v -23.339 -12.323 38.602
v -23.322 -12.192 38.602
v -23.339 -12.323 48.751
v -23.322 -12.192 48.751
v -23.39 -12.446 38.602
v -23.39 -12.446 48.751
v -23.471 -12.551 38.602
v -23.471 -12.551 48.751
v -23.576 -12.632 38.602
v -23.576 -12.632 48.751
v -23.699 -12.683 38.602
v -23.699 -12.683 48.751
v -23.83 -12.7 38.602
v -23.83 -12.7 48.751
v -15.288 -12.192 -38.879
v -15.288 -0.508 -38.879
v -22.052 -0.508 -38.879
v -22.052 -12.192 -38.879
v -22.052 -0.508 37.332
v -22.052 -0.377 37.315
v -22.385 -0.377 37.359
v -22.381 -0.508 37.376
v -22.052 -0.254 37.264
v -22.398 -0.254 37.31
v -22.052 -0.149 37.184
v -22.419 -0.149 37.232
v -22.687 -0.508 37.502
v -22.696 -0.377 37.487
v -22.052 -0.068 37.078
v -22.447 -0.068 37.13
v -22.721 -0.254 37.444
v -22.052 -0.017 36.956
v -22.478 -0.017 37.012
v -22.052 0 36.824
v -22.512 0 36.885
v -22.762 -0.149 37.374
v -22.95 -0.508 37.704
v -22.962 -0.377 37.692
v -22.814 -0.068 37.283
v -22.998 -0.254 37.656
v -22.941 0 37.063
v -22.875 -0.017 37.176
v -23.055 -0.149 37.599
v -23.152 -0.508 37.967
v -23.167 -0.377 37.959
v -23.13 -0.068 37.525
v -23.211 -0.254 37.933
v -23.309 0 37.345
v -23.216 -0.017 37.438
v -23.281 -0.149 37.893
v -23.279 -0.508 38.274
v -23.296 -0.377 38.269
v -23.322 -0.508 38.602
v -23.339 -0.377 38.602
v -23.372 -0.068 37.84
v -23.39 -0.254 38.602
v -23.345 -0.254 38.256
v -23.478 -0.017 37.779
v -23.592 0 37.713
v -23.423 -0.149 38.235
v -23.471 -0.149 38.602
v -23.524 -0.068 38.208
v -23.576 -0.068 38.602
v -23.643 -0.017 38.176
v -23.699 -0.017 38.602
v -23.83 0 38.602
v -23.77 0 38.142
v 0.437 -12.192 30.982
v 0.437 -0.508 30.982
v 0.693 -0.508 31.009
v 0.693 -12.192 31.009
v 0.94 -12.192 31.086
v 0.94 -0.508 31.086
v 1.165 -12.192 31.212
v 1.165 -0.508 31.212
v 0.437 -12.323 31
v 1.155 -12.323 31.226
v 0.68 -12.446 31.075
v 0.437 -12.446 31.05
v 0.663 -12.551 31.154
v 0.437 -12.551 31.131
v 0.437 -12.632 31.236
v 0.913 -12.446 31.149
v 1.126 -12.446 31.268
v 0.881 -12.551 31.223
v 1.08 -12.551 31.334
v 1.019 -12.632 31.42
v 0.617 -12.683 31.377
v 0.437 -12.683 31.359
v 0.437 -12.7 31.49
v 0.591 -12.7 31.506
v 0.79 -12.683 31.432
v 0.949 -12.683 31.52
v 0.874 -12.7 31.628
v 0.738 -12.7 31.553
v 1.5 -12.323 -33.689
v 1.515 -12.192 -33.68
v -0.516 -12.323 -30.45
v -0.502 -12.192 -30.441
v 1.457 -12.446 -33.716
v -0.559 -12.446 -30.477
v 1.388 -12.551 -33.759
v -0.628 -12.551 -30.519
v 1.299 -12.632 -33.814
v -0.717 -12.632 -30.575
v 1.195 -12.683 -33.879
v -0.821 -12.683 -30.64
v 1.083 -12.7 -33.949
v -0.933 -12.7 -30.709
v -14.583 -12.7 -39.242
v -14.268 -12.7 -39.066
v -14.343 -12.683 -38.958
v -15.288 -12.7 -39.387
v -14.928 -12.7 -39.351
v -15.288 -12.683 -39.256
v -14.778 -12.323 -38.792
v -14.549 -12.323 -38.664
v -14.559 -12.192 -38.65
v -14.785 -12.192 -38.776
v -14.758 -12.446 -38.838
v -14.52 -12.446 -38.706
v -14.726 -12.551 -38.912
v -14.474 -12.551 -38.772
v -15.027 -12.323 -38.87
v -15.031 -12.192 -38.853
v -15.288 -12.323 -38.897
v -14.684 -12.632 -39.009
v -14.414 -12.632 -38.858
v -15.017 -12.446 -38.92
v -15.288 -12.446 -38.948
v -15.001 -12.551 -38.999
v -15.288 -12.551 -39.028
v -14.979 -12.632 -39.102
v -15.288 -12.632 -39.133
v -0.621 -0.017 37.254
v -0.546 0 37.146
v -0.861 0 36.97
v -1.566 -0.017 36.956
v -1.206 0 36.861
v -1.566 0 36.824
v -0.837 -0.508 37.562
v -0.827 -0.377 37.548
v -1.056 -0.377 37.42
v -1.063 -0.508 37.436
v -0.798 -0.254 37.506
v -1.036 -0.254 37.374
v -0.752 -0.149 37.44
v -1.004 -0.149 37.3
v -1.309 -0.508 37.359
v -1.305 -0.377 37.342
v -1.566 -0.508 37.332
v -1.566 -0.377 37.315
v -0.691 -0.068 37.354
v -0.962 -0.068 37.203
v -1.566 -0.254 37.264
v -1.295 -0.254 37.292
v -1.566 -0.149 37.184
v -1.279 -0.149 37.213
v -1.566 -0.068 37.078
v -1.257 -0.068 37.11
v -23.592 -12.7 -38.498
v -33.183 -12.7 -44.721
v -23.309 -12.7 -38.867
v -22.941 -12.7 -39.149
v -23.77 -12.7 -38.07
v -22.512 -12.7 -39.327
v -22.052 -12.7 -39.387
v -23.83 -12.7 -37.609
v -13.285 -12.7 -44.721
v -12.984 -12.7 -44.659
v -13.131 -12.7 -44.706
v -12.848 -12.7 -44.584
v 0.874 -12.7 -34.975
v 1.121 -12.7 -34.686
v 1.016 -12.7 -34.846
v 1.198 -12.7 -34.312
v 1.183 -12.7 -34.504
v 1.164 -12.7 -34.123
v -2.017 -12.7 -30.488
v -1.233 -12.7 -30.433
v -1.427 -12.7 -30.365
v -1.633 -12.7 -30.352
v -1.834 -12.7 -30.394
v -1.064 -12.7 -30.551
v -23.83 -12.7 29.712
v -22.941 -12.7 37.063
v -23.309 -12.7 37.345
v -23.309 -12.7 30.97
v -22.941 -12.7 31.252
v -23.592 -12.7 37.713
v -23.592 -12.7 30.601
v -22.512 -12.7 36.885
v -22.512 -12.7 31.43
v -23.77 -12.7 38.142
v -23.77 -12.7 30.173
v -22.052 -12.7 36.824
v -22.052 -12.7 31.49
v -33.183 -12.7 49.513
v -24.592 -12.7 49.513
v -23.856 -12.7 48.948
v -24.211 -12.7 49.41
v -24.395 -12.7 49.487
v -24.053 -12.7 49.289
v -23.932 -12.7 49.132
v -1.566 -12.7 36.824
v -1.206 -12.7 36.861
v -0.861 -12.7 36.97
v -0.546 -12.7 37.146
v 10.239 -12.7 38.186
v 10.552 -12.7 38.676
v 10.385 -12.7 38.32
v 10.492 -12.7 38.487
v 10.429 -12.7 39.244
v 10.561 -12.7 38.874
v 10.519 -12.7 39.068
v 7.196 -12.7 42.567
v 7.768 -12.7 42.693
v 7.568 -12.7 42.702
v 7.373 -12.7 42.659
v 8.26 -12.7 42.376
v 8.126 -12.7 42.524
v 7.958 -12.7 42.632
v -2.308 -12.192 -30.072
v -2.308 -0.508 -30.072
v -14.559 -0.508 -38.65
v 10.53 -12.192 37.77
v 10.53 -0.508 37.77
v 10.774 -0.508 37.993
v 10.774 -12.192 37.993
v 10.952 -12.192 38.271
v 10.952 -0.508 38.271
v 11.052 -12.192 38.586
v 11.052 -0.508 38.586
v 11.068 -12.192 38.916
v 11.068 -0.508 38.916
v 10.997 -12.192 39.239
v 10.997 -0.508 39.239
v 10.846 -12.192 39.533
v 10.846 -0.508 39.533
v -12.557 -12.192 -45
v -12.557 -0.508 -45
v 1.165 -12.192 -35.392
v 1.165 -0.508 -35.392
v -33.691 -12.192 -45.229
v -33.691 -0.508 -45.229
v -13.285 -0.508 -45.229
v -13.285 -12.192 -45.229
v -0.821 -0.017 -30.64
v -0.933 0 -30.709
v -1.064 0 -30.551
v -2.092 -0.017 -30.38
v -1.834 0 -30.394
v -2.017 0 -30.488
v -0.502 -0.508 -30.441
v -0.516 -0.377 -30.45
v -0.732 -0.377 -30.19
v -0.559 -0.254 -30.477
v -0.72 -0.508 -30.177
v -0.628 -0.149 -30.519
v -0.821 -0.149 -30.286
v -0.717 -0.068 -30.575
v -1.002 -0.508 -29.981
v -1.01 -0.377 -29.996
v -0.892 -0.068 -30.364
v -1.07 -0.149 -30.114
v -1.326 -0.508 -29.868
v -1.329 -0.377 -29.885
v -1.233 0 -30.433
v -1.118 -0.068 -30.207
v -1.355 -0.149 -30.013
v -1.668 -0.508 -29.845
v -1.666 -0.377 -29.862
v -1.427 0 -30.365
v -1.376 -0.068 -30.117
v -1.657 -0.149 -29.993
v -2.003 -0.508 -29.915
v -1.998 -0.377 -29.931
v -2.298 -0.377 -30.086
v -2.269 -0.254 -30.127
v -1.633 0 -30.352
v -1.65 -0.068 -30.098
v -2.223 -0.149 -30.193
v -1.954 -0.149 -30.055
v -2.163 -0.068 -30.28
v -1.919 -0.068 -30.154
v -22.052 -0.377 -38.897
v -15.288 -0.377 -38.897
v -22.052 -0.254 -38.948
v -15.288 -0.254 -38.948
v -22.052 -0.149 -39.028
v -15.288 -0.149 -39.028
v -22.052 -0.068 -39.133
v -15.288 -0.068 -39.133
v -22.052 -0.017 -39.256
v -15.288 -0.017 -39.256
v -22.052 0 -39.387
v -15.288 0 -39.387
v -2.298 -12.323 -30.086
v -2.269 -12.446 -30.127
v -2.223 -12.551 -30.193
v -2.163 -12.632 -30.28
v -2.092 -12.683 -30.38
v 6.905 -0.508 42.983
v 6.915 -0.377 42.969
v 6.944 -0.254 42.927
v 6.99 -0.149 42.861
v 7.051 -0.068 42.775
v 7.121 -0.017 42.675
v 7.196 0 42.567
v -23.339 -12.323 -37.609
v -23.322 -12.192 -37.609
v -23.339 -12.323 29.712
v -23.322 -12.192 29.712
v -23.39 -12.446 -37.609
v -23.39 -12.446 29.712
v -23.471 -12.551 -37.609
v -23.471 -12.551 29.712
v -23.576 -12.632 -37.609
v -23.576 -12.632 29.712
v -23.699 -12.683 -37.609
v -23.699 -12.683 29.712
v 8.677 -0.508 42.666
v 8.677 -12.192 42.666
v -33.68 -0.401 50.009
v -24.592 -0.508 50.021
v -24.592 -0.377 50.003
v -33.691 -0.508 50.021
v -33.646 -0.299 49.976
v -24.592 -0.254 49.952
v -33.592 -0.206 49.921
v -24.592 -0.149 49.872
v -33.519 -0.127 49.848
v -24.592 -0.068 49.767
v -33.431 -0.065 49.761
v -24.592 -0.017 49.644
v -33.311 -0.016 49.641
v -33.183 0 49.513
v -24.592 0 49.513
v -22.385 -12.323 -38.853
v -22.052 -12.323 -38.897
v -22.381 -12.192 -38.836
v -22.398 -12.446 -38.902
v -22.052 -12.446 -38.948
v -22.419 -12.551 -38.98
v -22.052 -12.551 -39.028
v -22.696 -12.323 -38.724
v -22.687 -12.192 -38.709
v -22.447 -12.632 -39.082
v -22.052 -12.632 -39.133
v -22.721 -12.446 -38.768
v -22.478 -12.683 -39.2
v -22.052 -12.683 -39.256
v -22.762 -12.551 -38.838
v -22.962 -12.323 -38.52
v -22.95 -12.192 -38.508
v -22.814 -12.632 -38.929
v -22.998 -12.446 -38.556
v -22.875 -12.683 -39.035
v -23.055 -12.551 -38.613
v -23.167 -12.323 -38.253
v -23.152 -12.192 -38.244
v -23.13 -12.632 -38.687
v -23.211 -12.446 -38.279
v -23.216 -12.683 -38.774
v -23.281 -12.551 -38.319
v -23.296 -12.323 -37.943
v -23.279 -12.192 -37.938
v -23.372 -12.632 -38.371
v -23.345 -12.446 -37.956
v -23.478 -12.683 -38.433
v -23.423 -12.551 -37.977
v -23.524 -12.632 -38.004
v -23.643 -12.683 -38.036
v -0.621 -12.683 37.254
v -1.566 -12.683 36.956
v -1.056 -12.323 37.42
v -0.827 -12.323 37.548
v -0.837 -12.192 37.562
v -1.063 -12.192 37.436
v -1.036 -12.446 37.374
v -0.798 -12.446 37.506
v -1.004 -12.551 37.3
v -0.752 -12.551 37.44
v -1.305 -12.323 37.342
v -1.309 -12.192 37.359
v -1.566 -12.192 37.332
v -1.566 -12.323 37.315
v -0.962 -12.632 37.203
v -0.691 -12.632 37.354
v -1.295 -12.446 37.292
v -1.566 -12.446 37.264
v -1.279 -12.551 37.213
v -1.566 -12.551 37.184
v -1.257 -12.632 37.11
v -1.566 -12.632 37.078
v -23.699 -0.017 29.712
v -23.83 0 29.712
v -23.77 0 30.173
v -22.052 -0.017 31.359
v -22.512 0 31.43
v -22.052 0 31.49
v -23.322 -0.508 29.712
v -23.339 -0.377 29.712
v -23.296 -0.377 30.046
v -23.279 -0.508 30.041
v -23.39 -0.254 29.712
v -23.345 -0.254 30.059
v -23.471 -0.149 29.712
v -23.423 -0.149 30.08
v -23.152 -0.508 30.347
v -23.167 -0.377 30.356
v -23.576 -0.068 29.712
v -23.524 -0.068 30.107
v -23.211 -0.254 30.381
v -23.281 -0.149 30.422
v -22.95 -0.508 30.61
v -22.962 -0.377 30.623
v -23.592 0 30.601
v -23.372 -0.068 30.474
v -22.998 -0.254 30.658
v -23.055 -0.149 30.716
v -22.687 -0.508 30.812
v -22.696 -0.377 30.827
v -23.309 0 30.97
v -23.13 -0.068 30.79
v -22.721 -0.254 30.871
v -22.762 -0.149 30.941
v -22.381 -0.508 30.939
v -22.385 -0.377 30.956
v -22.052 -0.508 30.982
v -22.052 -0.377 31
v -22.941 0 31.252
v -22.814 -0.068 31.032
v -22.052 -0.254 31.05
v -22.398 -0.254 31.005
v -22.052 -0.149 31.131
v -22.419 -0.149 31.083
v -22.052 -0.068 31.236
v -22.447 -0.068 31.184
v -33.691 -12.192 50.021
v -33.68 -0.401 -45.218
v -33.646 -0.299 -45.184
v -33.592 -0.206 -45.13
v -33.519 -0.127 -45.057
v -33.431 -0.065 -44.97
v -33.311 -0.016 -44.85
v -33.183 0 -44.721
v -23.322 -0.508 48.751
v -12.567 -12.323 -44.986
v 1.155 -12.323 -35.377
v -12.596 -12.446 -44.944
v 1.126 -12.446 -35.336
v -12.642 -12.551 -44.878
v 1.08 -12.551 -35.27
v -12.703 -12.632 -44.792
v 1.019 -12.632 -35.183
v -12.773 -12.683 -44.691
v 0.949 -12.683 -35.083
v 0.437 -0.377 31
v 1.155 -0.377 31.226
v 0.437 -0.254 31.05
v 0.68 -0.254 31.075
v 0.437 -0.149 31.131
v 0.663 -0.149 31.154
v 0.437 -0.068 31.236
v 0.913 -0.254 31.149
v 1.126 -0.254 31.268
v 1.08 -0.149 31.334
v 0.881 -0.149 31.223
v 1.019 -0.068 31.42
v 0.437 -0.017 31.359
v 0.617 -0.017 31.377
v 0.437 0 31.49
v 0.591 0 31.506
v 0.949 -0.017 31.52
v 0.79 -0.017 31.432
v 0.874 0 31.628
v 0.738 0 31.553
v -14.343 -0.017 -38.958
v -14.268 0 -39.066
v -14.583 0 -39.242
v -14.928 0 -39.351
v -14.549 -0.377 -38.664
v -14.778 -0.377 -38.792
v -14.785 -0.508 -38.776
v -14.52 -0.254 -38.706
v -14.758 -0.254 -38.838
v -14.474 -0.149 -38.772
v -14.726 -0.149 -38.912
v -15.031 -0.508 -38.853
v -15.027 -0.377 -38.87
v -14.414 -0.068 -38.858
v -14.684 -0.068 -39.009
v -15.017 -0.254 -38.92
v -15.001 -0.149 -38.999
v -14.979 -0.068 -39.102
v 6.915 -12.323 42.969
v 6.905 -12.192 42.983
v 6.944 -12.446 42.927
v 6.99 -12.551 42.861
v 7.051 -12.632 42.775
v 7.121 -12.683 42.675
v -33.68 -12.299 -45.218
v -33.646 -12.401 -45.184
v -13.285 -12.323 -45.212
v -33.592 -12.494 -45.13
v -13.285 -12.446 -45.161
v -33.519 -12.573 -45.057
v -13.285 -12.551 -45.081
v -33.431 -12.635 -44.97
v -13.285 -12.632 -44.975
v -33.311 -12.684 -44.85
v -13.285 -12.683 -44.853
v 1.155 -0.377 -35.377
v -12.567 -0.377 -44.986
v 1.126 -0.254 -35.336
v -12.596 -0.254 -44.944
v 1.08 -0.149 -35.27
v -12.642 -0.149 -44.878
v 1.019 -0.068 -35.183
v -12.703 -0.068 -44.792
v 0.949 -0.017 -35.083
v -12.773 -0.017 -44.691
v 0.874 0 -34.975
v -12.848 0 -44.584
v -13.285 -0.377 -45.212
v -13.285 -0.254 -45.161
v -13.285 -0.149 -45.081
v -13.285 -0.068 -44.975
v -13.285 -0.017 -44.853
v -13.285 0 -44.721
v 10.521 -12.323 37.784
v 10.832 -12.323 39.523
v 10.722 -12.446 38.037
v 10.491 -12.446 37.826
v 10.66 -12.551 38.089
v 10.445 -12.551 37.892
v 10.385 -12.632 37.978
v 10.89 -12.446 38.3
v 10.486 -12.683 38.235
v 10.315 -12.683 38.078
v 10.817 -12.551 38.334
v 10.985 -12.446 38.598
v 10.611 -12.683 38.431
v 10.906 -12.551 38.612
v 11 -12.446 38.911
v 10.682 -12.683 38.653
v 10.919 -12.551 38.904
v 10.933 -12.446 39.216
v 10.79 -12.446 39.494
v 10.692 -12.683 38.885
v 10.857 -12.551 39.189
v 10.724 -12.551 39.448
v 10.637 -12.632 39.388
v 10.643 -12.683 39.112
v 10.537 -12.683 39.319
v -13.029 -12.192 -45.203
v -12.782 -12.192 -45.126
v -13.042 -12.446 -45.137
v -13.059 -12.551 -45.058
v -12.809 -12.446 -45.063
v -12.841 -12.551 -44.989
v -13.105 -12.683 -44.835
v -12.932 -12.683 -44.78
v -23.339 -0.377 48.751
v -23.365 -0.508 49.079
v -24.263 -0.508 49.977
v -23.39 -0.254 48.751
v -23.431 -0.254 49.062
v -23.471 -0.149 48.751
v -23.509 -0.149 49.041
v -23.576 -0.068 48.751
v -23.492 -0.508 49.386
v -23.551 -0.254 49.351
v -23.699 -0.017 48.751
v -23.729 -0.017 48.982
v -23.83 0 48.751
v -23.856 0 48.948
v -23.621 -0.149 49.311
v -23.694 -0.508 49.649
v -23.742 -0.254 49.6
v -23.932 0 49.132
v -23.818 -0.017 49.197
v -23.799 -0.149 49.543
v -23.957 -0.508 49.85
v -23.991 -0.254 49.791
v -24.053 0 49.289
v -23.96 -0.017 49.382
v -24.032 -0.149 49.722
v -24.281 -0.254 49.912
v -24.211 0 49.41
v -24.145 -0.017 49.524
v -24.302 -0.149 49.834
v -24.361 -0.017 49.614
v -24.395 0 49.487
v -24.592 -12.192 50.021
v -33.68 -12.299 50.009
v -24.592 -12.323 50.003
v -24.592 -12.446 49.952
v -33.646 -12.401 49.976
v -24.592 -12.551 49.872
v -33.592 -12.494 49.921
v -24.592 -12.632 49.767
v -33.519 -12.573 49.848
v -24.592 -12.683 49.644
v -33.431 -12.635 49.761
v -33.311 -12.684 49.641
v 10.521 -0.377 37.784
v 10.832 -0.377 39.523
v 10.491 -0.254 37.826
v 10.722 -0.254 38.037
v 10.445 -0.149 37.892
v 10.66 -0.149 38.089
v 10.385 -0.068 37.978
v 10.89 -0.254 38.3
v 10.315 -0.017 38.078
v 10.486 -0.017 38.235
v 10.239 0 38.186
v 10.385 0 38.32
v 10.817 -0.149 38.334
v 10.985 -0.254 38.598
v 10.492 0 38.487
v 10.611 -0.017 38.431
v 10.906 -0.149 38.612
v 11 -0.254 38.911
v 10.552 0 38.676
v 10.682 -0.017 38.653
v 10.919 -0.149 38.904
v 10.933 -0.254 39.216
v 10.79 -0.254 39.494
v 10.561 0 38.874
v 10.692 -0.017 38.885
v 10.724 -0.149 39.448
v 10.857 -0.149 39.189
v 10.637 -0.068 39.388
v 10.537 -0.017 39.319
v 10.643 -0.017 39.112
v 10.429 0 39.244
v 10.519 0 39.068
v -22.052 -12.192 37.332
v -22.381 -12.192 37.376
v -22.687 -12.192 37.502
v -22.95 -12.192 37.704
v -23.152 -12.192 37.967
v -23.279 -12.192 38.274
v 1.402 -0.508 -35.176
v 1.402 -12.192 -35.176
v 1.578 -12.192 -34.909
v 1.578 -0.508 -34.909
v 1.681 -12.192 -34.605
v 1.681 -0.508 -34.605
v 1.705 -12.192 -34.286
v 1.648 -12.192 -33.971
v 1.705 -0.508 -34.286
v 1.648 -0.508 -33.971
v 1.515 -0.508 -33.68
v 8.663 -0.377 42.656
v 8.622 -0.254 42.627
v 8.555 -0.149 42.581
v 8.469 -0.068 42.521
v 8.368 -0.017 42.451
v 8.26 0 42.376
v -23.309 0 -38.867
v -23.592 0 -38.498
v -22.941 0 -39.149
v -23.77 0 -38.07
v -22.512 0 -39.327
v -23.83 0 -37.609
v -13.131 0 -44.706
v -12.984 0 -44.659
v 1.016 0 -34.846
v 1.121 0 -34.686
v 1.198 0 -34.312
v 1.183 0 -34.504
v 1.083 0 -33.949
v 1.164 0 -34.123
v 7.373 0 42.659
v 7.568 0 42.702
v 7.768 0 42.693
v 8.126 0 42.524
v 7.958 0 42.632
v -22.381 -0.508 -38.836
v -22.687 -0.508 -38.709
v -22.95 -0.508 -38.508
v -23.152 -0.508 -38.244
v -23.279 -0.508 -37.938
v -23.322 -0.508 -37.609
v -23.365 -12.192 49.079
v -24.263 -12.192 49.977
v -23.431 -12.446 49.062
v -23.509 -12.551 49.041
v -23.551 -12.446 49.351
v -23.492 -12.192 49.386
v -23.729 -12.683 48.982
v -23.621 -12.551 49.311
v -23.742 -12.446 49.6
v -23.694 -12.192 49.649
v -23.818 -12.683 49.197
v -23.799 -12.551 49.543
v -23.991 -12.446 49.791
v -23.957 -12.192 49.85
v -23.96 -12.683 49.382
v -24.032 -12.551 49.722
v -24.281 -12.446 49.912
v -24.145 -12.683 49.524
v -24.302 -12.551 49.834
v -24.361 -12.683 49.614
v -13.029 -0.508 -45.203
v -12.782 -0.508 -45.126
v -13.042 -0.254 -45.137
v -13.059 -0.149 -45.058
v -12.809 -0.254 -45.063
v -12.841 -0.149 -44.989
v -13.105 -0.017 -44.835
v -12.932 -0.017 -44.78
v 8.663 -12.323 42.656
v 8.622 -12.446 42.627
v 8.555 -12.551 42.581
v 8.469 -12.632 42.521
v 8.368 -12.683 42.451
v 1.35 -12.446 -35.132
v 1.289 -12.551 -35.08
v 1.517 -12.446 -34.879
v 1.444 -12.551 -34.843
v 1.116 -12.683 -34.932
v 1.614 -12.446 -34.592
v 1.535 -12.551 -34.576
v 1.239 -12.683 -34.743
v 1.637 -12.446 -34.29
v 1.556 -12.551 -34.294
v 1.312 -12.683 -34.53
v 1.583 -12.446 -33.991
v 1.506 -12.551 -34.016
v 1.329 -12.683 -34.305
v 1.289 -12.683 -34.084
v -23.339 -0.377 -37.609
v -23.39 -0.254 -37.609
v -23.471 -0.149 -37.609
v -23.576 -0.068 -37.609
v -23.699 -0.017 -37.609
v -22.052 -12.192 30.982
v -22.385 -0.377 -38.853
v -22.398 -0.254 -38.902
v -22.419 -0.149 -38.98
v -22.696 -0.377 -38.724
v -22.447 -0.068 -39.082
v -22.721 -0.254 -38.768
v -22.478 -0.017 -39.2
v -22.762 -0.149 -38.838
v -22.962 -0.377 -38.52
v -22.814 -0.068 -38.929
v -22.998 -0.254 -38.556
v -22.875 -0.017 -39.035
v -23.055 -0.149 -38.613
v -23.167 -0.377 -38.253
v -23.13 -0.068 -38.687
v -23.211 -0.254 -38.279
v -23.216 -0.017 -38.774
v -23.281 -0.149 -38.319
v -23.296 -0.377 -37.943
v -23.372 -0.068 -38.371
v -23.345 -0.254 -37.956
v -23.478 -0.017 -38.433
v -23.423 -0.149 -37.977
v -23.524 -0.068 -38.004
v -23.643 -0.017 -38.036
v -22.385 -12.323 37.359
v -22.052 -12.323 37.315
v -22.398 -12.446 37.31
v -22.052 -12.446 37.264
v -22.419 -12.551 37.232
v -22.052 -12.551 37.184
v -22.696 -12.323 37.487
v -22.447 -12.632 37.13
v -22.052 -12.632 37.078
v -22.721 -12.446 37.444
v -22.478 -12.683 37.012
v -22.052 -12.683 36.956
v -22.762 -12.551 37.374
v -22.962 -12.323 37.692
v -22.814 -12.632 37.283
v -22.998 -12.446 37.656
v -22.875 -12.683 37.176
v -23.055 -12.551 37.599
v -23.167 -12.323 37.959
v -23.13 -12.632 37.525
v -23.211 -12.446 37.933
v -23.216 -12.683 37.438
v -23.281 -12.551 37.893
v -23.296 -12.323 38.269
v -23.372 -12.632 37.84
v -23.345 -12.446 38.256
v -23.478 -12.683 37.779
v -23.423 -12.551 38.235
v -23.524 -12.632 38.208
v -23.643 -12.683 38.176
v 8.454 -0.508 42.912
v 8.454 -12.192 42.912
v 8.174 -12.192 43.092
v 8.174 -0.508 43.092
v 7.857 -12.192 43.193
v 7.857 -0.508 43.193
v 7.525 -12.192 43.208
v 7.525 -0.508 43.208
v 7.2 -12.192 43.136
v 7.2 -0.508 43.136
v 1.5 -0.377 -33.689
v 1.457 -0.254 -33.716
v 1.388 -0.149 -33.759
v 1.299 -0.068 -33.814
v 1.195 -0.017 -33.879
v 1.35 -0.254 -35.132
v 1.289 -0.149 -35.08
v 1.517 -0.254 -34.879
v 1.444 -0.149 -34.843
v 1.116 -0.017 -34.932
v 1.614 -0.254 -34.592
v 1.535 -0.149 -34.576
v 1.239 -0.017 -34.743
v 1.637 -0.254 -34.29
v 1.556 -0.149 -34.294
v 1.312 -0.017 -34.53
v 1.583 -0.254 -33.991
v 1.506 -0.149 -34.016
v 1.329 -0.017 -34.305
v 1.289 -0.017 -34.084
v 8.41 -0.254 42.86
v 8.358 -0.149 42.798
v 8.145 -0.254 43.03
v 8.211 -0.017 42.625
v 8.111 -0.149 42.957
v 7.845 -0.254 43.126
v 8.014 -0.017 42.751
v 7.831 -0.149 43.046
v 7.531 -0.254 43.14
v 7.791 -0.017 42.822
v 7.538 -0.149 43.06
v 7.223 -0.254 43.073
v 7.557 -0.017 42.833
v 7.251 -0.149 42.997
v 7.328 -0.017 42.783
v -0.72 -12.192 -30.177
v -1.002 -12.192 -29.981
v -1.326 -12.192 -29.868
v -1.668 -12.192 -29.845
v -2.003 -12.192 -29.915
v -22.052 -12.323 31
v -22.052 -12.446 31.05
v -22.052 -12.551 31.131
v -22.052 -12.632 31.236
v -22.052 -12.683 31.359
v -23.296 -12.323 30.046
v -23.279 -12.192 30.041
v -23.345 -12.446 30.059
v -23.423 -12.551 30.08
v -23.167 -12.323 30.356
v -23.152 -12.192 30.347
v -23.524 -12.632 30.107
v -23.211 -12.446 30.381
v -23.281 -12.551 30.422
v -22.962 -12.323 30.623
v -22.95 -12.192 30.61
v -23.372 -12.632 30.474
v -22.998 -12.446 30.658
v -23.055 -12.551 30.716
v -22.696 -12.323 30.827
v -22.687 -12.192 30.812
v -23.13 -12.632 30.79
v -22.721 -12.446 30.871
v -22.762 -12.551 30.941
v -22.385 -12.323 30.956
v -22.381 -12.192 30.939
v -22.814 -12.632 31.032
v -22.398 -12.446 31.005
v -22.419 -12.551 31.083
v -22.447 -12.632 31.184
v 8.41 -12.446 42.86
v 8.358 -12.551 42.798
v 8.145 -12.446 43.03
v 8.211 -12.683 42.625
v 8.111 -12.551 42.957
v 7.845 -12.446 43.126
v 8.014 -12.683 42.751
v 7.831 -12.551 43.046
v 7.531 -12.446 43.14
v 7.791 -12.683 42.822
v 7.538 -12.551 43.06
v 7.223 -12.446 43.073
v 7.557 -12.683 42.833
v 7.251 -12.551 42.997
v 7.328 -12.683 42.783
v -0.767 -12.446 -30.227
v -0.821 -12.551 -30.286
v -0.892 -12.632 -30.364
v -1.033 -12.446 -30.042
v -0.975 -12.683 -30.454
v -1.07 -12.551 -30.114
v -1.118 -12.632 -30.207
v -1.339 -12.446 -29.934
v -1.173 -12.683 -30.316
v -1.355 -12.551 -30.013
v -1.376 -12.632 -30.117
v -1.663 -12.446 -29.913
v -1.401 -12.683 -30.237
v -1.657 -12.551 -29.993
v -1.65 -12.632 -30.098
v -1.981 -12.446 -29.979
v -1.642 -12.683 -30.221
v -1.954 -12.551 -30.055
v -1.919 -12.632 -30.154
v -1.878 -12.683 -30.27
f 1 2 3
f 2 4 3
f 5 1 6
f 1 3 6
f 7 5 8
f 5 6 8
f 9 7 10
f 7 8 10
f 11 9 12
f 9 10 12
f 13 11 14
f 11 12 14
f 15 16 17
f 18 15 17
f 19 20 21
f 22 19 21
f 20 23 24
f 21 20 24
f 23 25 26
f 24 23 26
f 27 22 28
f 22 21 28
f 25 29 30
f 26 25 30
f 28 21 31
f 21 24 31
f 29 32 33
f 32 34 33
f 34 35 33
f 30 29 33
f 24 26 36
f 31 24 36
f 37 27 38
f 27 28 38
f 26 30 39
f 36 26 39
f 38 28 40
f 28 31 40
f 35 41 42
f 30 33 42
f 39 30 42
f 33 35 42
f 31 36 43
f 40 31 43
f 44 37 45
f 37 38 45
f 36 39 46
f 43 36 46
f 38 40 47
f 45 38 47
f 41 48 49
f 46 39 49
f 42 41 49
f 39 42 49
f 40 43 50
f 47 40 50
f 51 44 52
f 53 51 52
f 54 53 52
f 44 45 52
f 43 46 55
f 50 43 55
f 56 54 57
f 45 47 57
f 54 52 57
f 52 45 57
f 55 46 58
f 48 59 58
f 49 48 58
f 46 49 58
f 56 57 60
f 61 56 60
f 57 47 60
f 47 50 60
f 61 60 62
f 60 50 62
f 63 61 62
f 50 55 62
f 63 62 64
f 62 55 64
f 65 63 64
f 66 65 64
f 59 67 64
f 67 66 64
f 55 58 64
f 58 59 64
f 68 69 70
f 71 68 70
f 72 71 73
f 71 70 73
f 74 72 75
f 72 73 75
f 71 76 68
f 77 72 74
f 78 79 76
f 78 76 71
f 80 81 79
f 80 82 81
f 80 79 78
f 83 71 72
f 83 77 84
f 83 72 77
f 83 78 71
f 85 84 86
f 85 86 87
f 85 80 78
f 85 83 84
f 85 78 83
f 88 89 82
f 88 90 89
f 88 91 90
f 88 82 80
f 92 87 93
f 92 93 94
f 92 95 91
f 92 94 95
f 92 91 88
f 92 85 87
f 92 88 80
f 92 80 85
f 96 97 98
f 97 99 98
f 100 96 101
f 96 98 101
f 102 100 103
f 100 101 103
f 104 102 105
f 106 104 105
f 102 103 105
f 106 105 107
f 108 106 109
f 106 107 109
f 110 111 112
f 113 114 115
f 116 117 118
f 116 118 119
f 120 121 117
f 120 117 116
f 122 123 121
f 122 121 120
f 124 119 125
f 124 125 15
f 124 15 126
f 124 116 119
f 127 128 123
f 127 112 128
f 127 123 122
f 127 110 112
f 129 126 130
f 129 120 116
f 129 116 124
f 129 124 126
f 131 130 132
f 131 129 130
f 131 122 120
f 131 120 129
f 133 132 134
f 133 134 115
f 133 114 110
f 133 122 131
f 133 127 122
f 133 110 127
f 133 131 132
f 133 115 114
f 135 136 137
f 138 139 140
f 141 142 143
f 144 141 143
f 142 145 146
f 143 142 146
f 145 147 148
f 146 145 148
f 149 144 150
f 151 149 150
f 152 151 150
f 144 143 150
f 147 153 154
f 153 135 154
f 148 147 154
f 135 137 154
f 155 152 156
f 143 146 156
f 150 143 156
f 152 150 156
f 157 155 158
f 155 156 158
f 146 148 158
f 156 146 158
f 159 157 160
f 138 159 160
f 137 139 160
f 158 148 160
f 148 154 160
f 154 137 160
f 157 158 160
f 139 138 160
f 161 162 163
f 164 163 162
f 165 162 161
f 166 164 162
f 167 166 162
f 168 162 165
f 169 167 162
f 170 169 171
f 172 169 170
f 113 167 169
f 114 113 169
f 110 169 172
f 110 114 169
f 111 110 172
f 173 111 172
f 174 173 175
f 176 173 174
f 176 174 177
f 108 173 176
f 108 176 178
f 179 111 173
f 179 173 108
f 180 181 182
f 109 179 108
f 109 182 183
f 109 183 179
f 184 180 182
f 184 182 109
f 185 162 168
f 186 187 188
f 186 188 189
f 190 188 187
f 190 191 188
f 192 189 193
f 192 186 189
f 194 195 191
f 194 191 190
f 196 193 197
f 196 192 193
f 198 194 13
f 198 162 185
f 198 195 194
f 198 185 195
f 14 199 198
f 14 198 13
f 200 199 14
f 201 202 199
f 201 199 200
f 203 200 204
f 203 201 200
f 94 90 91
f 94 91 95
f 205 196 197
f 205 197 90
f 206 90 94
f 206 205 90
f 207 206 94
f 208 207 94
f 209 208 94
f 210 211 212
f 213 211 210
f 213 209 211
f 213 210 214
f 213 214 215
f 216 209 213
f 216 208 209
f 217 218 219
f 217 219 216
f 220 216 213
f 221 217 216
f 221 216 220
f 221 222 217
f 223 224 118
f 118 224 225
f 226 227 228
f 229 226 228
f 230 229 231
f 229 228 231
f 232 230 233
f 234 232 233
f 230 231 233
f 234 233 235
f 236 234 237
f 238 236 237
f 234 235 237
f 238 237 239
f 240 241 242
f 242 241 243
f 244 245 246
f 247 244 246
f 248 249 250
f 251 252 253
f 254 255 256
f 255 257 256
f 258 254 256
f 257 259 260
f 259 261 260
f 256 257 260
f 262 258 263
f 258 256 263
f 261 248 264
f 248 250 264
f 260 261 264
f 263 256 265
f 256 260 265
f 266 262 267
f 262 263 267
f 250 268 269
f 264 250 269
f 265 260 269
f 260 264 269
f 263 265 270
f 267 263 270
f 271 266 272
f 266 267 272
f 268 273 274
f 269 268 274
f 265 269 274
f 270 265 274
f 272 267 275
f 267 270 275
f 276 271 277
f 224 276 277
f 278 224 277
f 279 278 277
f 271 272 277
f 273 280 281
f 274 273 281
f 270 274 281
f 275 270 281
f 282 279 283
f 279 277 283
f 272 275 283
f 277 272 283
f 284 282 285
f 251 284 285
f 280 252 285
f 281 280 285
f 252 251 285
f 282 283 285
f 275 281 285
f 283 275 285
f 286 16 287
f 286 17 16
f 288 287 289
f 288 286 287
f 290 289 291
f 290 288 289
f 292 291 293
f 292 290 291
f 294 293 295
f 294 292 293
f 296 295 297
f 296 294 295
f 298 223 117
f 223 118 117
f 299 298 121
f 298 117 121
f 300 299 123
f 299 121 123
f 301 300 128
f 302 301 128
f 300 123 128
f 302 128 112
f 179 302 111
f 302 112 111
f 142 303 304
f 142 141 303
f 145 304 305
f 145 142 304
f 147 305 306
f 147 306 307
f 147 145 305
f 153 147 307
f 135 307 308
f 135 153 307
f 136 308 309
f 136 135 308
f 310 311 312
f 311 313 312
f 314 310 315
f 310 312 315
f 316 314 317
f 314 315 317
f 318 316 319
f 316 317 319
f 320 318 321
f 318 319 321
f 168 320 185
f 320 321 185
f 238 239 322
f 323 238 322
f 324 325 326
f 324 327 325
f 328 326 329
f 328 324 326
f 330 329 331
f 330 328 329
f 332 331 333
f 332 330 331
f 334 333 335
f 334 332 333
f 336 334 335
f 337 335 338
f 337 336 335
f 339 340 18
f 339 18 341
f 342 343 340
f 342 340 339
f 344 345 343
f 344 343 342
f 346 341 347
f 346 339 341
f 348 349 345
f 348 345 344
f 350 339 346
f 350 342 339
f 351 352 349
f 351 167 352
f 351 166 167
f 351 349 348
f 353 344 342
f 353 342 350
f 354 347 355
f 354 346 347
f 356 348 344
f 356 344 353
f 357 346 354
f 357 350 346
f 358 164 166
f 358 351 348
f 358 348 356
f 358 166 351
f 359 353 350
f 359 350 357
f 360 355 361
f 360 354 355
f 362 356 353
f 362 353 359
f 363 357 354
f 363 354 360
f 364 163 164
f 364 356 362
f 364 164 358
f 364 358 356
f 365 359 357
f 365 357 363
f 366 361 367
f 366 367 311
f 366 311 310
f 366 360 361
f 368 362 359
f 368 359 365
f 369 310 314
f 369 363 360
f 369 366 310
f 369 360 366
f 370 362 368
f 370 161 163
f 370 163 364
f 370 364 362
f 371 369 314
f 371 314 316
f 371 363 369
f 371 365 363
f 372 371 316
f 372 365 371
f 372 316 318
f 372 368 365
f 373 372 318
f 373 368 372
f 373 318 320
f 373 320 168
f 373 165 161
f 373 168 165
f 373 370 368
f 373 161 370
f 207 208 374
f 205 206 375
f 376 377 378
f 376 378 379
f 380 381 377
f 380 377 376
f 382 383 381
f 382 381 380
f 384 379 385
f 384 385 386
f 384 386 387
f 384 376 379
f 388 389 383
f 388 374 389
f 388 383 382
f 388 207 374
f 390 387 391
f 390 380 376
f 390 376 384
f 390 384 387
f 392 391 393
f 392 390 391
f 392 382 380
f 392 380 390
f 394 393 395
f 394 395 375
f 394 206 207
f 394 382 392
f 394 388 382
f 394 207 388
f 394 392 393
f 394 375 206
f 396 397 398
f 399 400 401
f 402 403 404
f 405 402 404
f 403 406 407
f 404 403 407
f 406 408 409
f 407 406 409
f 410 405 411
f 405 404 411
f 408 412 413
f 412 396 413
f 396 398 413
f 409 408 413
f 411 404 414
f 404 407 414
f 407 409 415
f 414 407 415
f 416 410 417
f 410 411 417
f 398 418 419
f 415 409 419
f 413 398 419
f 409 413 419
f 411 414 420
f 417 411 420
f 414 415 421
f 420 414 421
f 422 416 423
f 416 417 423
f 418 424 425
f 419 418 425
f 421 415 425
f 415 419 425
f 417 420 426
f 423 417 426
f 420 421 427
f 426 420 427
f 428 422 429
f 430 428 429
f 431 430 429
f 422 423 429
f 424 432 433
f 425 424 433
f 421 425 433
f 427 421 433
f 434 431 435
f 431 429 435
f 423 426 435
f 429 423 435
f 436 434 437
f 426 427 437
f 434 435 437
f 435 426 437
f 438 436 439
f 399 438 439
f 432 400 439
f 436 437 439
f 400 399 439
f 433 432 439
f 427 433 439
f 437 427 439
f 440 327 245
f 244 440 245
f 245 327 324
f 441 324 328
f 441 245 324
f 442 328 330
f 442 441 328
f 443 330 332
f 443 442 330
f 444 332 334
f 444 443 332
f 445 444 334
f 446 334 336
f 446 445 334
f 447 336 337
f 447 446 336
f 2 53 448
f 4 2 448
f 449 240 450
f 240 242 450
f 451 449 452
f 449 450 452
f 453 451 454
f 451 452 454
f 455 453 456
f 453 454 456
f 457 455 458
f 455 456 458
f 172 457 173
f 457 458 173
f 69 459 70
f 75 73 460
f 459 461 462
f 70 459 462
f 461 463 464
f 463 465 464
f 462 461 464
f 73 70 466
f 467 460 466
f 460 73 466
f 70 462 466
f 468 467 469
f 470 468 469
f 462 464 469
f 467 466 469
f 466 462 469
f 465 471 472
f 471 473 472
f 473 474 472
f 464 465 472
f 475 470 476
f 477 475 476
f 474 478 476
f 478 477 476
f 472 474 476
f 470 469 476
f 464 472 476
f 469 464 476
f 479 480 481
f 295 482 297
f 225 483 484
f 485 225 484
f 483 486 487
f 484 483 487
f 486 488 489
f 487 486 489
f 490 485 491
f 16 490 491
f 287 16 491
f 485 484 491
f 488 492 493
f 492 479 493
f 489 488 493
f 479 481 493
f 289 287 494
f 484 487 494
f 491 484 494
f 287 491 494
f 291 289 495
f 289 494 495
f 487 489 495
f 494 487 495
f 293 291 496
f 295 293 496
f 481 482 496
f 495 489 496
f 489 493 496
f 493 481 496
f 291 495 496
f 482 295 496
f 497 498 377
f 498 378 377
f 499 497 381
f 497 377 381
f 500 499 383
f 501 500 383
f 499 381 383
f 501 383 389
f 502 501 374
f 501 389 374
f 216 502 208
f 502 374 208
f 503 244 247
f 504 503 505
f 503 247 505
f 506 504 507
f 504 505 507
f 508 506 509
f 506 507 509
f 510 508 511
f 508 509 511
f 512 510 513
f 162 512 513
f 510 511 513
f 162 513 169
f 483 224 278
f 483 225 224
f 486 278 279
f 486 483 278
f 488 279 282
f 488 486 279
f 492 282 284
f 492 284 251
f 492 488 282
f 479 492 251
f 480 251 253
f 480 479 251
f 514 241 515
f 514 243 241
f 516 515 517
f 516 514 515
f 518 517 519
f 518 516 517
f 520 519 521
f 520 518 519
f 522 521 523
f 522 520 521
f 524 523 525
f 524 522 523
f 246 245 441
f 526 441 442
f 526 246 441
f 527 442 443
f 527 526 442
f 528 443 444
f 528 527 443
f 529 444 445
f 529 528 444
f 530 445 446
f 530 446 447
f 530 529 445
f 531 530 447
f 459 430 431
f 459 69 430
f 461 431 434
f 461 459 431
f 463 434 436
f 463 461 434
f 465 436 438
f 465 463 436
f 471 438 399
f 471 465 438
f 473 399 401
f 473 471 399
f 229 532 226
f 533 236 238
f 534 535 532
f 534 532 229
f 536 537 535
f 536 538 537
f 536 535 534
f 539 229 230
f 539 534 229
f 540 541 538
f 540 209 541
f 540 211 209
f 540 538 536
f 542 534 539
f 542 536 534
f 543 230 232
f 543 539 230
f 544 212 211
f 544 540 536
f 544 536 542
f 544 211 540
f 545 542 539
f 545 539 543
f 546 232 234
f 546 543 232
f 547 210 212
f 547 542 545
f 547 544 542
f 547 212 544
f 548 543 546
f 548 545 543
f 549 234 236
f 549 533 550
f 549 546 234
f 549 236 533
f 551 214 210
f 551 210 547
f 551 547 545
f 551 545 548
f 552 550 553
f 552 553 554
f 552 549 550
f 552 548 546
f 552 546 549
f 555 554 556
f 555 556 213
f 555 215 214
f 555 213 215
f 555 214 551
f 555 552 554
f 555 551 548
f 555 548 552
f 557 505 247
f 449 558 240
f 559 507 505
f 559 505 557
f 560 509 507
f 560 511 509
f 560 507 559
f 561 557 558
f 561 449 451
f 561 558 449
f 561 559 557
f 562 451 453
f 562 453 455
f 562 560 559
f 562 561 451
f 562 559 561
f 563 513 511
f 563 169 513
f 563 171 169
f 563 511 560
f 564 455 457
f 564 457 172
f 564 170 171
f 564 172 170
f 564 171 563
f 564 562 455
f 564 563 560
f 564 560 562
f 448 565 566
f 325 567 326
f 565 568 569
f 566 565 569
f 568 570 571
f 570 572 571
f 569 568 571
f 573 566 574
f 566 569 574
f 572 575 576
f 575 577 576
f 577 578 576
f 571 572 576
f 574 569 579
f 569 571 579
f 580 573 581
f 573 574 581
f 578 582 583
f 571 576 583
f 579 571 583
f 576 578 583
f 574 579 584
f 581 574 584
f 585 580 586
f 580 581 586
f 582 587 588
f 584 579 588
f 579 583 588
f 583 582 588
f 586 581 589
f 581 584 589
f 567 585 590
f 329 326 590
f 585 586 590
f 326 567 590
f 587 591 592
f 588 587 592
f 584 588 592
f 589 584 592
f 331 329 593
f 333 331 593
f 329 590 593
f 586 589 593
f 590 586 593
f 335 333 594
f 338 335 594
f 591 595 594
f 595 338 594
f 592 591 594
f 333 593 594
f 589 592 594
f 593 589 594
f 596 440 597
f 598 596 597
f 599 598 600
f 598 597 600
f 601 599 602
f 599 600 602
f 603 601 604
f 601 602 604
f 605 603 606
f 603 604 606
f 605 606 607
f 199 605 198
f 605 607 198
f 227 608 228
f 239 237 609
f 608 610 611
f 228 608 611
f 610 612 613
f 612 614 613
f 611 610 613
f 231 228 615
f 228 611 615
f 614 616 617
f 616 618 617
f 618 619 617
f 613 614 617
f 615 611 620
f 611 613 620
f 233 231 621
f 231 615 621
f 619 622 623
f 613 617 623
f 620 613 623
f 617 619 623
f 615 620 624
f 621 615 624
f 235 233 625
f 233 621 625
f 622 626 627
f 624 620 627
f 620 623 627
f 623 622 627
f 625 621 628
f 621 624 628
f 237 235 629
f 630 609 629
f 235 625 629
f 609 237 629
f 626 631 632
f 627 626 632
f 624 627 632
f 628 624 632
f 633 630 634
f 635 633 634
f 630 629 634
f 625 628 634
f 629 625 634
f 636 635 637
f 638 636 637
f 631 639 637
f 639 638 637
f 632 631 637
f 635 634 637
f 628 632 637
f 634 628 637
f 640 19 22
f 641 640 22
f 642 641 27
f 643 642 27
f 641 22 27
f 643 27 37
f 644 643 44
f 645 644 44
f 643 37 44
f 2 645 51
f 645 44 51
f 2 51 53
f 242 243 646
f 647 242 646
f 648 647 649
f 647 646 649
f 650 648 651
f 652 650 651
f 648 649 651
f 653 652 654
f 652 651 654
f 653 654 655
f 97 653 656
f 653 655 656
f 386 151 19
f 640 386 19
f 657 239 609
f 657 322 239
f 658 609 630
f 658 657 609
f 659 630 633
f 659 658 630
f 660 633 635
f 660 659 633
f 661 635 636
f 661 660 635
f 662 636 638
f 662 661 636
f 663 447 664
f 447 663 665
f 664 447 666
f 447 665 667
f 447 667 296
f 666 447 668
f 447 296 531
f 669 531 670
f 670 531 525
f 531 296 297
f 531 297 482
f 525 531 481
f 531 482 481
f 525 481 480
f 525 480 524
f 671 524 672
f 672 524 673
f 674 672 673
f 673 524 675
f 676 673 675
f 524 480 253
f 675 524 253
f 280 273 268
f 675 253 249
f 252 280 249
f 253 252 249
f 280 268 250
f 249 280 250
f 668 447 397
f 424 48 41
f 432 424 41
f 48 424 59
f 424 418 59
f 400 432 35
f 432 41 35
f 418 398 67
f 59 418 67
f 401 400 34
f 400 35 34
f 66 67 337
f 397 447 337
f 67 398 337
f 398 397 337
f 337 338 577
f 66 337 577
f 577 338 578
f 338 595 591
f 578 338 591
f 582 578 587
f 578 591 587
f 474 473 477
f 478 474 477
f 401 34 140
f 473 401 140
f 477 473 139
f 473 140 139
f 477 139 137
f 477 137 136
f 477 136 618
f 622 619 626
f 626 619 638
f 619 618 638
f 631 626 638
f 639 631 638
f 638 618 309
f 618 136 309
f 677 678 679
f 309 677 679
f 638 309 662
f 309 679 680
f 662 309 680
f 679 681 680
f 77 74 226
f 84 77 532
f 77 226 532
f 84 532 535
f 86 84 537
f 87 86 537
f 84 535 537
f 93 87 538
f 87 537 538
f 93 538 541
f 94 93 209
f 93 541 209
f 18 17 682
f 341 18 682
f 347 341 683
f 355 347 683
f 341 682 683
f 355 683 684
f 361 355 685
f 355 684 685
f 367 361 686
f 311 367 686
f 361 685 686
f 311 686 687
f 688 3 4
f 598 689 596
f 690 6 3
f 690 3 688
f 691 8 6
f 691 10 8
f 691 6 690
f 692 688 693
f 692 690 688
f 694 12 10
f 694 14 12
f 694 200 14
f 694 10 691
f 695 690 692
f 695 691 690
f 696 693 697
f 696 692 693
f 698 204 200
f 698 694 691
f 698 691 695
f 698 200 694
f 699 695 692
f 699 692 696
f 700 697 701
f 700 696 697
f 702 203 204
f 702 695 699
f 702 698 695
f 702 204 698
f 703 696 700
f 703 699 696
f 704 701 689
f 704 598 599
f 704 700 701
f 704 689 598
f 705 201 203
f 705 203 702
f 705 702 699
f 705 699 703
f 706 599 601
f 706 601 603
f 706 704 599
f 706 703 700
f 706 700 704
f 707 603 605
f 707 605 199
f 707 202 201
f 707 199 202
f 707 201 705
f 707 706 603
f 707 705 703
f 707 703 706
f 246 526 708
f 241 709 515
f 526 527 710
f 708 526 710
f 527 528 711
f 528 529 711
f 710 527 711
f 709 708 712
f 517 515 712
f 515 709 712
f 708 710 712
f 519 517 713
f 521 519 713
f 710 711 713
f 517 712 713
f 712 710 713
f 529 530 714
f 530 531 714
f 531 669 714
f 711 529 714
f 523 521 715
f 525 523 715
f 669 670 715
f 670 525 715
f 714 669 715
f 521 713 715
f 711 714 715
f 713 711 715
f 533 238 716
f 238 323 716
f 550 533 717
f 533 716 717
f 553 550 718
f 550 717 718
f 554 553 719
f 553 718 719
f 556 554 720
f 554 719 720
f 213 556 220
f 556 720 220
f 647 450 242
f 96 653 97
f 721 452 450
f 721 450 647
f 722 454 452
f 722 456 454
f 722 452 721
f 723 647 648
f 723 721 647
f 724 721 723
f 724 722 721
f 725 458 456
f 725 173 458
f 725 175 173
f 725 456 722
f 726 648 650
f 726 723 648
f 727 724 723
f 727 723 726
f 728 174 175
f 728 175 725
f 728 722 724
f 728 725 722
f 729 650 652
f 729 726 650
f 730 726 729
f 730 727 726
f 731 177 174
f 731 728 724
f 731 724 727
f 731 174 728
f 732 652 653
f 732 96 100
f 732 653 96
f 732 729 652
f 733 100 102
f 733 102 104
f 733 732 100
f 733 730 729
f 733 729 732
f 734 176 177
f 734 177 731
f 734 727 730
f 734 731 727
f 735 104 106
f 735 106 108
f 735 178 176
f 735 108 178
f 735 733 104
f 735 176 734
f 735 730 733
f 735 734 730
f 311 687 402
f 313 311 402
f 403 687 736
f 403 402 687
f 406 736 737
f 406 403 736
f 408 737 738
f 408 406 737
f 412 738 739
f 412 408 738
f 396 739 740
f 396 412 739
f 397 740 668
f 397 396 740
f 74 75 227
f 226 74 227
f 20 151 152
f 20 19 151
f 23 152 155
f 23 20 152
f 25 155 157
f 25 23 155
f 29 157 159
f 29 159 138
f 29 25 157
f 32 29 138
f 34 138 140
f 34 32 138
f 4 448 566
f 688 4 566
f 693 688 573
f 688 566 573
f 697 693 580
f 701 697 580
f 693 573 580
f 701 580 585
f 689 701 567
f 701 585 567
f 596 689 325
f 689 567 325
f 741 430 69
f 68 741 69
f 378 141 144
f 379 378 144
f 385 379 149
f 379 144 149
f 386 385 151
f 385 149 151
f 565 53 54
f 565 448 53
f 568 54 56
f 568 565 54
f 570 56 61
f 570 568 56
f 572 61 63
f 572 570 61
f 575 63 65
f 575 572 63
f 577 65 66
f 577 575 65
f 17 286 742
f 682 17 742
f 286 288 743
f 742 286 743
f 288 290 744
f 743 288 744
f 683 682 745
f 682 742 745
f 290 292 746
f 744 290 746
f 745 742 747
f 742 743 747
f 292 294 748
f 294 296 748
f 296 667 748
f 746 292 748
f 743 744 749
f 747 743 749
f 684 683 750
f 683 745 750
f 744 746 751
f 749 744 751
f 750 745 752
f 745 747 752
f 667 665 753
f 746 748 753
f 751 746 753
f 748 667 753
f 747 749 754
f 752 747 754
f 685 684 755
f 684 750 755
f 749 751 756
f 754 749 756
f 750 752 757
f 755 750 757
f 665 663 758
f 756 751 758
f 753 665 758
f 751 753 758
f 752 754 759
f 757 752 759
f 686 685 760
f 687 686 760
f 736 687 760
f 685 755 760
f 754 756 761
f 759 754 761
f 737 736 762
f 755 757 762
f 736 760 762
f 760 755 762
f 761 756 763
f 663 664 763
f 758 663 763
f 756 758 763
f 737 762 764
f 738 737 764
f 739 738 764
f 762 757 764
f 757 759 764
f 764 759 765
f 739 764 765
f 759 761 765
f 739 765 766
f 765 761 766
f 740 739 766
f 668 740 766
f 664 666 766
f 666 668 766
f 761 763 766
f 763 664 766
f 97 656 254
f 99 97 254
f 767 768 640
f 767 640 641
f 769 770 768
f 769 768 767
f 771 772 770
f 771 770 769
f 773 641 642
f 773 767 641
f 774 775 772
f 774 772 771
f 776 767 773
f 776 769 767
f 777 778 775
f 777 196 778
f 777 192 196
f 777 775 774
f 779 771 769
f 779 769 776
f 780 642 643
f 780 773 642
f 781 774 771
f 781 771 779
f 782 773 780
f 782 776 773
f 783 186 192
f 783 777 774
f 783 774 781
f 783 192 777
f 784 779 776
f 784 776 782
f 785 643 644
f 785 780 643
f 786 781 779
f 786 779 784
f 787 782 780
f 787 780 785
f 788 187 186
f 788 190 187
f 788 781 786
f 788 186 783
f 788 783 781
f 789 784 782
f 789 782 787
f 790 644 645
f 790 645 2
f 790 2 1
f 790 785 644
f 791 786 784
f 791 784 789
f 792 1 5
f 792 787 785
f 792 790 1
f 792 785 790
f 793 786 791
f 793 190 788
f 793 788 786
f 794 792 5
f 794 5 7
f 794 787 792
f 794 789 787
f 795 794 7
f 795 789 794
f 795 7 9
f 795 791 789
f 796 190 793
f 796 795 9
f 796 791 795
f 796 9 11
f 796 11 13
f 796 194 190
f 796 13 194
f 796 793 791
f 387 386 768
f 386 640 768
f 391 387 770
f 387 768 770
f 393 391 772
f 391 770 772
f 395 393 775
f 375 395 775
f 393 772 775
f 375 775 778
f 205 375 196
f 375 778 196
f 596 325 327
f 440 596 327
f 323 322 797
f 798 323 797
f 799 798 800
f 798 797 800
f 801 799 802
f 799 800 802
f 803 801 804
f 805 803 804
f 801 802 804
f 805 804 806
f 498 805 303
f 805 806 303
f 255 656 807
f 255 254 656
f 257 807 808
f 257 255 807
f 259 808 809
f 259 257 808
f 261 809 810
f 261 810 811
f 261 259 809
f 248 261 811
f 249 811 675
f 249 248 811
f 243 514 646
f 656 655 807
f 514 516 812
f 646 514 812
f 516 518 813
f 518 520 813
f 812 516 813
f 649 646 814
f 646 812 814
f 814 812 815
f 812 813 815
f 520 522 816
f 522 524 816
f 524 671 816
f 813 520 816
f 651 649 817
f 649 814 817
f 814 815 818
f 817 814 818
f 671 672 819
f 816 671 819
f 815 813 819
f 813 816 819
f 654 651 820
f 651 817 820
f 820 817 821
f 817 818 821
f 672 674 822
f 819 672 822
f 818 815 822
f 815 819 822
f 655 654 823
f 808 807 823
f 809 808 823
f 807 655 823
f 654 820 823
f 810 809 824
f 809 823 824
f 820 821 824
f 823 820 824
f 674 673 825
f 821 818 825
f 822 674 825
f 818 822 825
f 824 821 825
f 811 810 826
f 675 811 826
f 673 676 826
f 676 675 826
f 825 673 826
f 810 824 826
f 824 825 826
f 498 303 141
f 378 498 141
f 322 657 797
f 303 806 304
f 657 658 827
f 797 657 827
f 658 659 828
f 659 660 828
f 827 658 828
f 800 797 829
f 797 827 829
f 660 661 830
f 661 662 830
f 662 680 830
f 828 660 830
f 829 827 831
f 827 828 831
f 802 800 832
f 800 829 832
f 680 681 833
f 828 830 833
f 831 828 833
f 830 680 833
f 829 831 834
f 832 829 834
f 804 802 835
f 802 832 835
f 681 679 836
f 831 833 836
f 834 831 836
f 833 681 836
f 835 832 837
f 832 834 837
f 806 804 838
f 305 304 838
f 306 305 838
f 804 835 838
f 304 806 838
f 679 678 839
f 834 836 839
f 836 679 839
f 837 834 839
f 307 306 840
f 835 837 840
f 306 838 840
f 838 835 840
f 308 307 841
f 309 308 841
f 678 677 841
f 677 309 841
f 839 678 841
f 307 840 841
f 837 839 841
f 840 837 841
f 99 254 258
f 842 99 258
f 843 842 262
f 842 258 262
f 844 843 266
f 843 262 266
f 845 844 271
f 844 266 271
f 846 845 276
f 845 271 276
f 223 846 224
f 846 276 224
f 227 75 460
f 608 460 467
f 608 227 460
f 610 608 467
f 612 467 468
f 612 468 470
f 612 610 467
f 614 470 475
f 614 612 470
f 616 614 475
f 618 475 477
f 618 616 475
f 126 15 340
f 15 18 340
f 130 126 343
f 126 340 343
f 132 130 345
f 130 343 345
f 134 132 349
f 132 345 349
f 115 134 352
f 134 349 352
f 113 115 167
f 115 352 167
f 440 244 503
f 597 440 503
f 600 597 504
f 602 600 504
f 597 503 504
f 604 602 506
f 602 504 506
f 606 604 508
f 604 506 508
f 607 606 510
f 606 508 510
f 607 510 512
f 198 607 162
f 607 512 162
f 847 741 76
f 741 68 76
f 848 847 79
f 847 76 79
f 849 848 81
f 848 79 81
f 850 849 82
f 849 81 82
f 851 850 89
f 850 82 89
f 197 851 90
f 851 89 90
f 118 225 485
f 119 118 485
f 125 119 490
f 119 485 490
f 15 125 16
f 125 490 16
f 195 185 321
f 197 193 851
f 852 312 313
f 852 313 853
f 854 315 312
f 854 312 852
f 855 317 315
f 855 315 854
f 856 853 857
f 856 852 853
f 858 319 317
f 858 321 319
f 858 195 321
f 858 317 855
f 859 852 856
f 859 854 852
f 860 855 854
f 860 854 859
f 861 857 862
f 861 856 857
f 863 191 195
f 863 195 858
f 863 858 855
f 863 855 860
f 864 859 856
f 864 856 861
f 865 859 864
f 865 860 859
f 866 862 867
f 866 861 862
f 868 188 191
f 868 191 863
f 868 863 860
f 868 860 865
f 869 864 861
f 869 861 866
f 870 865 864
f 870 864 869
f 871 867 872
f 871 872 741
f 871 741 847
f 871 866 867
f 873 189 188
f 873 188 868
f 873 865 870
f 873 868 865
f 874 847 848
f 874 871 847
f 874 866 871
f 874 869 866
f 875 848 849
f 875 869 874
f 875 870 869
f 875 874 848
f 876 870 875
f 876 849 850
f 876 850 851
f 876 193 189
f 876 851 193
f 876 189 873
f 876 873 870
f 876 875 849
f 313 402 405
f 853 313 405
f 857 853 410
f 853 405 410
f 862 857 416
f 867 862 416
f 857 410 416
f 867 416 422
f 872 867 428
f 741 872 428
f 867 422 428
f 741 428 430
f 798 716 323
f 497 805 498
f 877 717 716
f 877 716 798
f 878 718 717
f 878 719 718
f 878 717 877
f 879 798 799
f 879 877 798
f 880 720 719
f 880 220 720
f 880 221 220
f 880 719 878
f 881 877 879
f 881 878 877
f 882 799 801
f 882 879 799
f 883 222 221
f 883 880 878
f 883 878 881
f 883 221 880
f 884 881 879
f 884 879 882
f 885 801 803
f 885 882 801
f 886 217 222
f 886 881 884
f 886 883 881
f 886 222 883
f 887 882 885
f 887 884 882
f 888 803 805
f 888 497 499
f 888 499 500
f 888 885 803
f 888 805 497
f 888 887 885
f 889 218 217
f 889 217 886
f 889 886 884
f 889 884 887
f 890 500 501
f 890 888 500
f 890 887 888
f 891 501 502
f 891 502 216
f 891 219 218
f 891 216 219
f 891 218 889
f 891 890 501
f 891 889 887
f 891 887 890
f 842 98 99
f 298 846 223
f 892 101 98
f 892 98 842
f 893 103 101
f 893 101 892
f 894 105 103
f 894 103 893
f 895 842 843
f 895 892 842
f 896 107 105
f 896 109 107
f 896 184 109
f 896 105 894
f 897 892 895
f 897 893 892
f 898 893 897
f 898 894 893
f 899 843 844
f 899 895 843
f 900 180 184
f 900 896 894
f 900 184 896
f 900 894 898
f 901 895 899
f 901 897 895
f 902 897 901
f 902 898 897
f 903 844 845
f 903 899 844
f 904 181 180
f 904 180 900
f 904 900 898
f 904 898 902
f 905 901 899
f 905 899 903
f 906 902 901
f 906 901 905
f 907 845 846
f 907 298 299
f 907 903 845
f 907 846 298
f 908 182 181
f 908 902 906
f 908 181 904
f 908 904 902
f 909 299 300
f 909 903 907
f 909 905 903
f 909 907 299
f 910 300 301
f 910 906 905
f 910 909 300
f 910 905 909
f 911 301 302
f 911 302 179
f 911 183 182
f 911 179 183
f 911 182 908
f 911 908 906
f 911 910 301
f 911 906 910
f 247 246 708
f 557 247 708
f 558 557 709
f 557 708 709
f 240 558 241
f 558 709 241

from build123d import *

# Parameters (mm, degrees)
F1_DEPTH = 12.7
F2_R     = 0.508


with BuildPart() as f1:
    # F0 (on Front) → F1 (new body)
    with BuildSketch(Plane.XZ):
        with BuildLine():
            Line((-24.592176, 50.020517), (-33.691168, 50.020517))
            Line((-33.691168, 50.020517), (-33.691168, -38.879483))
            Line((-33.691168, -38.879483), (-33.691168, -45.229483))
            Line((-33.691168, -45.229483), (-23.321956, -45.229483))
            Line((-23.321956, -45.229483), (-13.285488, -45.229483))
            ThreePointArc((-13.285488, -45.229483), (-12.903592, -45.170703), (-12.557046, -44.999806))
            Line((-12.557046, -44.999806), (1.165009, -35.391519))
            ThreePointArc((1.165009, -35.391519), (1.680854, -34.605461), (1.514742, -33.680048))
            Line((1.514742, -33.680048), (-0.50165, -30.440789))
            ThreePointArc((-0.50165, -30.440789), (-1.325559, -29.867651), (-2.308267, -30.071614))
            Line((-2.308267, -30.071614), (-14.559193, -38.649806))
            ThreePointArc((-14.559193, -38.649806), (-14.905739, -38.820703), (-15.287635, -38.879483))
            Line((-15.287635, -38.879483), (-22.052176, -38.879483))
            ThreePointArc((-22.052176, -38.879483), (-22.950201, -38.507508), (-23.322176, -37.609483))
            Line((-23.322176, -37.609483), (-23.322176, 29.712342))
            ThreePointArc((-23.322176, 29.712342), (-22.950201, 30.610368), (-22.052176, 30.982342))
            Line((-22.052176, 30.982342), (0.436567, 30.982342))
            ThreePointArc((0.436567, 30.982342), (0.818464, 31.041122), (1.165009, 31.212019))
            Line((1.165009, 31.212019), (10.530465, 37.769782))
            ThreePointArc((10.530465, 37.769782), (11.052137, 38.586245), (10.846207, 39.533001))
            Line((10.846207, 39.533001), (8.677486, 42.665598))
            ThreePointArc((8.677486, 42.665598), (7.857162, 43.192816), (6.90486, 42.983024))
            Line((6.90486, 42.983024), (-0.837138, 37.562019))
            ThreePointArc((-0.837138, 37.562019), (-1.183684, 37.391122), (-1.56558, 37.332342))
            Line((-1.56558, 37.332342), (-22.052176, 37.332342))
            ThreePointArc((-22.052176, 37.332342), (-22.950201, 37.704317), (-23.322176, 38.602342))
            Line((-23.322176, 38.602342), (-23.322176, 48.750517))
            ThreePointArc((-23.322176, 48.750517), (-23.69415, 49.648543), (-24.592176, 50.020517))
        make_face()
    extrude(amount=F1_DEPTH)

    # F2
    f2_edges = [f1.edges().sort_by_distance(p)[0] for p in [
        (-1.183684, -12.7, 37.391122),
        (-11.808878, -12.7, 37.332342),
        (-22.950201, -12.7, 37.704317),
        (-23.322176, -12.7, 43.67643),
        (-23.69415, -12.7, 49.648543),
        (-29.141672, -12.7, 50.020517),
        (-33.691168, -12.7, 2.395517),
        (-23.488328, -12.7, -45.229483),
        (-12.903592, -12.7, -45.170703),
        (-5.696018, -12.7, -40.195662),
        (1.680854, -12.7, -34.605461),
        (0.506546, -12.7, -32.060419),
        (-1.325559, -12.7, -29.867651),
        (-8.43373, -12.7, -34.36071),
        (-14.905739, -12.7, -38.820703),
        (-18.669906, -12.7, -38.879483),
        (-22.950201, -12.7, -38.507508),
        (-23.322176, -12.7, -3.94857),
        (-22.950201, -12.7, 30.610368),
        (-10.807804, -12.7, 30.982342),
        (0.818464, -12.7, 31.041122),
        (5.847737, -12.7, 34.4909),
        (11.052137, -12.7, 38.586245),
        (9.761846, -12.7, 41.0993),
        (7.857162, -12.7, 43.192816),
        (3.033861, -12.7, 40.272522),
        (-1.183684, 0, 37.391122),
        (-11.808878, 0, 37.332342),
        (-22.950201, 0, 37.704317),
        (-23.322176, 0, 43.67643),
        (-23.69415, 0, 49.648543),
        (-29.141672, 0, 50.020517),
        (-33.691168, 0, 2.395517),
        (-23.488328, 0, -45.229483),
        (-12.903592, 0, -45.170703),
        (-5.696018, 0, -40.195662),
        (1.680854, 0, -34.605461),
        (0.506546, 0, -32.060419),
        (-1.325559, 0, -29.867651),
        (-8.43373, 0, -34.36071),
        (-14.905739, 0, -38.820703),
        (-18.669906, 0, -38.879483),
        (-22.950201, 0, -38.507508),
        (-23.322176, 0, -3.94857),
        (-22.950201, 0, 30.610368),
        (-10.807804, 0, 30.982342),
        (0.818464, 0, 31.041122),
        (5.847737, 0, 34.4909),
        (11.052137, 0, 38.586245),
        (9.761846, 0, 41.0993),
        (7.857162, 0, 43.192816),
        (3.033861, 0, 40.272522),
    ]]
    fillet(f2_edges, radius=F2_R)


solid = f1.part
